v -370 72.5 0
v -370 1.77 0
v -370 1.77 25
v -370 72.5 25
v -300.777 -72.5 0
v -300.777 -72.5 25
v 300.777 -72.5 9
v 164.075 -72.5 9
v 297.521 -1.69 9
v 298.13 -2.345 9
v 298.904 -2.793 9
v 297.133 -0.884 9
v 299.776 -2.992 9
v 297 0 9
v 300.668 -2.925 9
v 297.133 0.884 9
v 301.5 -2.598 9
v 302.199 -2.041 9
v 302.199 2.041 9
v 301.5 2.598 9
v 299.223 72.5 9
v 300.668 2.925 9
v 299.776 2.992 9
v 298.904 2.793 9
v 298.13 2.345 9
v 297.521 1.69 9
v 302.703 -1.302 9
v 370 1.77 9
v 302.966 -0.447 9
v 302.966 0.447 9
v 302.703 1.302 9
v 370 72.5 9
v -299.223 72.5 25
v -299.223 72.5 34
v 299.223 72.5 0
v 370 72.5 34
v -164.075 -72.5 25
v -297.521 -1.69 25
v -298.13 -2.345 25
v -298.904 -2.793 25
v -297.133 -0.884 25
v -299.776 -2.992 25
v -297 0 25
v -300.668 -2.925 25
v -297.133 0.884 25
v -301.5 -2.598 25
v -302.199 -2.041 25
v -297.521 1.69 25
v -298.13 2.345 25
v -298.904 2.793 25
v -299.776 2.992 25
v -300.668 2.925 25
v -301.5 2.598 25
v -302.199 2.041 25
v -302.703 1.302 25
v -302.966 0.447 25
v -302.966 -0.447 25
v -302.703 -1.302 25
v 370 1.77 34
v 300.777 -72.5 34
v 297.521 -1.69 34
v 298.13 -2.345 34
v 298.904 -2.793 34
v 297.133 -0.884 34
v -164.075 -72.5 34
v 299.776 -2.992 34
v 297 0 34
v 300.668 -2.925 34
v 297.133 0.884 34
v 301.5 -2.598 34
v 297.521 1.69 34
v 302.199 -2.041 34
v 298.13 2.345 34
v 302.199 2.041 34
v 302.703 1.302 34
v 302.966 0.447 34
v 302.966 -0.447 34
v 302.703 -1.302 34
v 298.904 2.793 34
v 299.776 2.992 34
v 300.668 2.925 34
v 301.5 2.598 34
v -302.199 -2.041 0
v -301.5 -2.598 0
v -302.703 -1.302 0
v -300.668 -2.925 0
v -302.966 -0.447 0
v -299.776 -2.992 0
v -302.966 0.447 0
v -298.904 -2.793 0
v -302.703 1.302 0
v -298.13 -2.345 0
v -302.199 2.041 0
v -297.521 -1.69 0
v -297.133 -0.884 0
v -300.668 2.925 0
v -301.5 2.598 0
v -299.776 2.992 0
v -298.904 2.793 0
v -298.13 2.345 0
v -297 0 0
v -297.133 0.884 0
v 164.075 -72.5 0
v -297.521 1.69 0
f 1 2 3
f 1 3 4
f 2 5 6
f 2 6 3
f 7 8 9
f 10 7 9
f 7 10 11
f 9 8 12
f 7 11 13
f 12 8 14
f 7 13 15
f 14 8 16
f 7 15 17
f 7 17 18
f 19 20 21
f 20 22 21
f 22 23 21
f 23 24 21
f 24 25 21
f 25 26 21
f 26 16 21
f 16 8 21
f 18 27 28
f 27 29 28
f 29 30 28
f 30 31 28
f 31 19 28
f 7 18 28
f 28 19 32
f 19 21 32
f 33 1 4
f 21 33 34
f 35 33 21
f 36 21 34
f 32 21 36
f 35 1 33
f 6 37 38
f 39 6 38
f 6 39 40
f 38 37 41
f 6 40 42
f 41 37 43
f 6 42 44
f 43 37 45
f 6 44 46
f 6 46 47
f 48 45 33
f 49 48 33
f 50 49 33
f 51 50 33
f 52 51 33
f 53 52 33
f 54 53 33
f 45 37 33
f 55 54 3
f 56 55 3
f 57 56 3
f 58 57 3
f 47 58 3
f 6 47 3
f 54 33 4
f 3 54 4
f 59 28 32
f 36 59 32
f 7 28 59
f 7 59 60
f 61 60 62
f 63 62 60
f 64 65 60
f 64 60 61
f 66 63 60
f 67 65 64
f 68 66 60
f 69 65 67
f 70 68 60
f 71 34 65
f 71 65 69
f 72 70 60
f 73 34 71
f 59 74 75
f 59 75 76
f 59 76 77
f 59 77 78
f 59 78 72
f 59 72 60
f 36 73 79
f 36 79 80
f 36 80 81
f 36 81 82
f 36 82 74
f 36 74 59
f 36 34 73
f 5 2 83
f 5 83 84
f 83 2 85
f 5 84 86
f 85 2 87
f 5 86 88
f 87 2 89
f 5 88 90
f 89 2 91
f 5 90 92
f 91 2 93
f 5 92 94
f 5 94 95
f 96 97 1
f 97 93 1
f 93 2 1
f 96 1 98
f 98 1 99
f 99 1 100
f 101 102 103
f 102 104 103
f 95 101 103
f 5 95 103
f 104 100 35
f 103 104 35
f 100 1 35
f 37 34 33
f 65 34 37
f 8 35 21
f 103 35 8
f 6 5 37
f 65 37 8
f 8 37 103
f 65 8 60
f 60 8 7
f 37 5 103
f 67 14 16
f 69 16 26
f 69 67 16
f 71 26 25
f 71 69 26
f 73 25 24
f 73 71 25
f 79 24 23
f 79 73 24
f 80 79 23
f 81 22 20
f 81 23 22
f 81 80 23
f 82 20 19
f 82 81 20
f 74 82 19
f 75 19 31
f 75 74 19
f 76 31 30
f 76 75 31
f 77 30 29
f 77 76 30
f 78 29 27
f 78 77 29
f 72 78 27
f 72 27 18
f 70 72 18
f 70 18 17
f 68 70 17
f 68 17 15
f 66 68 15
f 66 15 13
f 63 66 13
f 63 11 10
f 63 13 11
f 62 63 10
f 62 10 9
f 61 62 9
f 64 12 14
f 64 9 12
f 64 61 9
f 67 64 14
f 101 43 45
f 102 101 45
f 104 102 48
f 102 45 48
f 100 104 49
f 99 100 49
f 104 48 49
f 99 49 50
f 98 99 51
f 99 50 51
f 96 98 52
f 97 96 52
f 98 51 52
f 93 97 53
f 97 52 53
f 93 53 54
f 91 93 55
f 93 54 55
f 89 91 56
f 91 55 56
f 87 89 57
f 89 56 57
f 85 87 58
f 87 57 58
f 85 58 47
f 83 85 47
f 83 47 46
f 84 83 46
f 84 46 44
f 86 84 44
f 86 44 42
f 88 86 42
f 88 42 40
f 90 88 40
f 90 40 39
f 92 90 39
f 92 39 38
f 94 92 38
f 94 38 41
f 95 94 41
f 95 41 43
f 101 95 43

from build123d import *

# Parameters (mm, degrees)
SKETCH1_W           = 740
SKETCH1_H           = 145
BOSS_EXTRUDE1_DEPTH = 34
SKETCH2_R           = 3
CUT_EXTRUDE1_DEPTH  = 379.566044436
CUT_EXTRUDE2_DEPTH  = 379.566044436
CUT_EXTRUDE3_DEPTH  = 9
CUT_EXTRUDE4_DEPTH  = 9


with BuildPart() as part:
    # Sketch1 → Boss-Extrude1 (new body)
    with BuildSketch(Plane.XY):
        Rectangle(SKETCH1_W, SKETCH1_H)
    extrude(amount=BOSS_EXTRUDE1_DEPTH)

    # Sketch2 → Cut-Extrude1 (cut, through all)
    with BuildSketch(Plane.XY.offset(34)):
        with Locations((-300, 0)):
            Circle(SKETCH2_R)
    cut_extrude1 = extrude(amount=-CUT_EXTRUDE1_DEPTH, mode=Mode.SUBTRACT)

    # Mirror1: Cut-Extrude1 across plane
    add(cut_extrude1.mirror(Plane(origin=(0, 0, 0), x_dir=(0, 0, 1), z_dir=(1, 0, 0))), mode=Mode.SUBTRACT)

    # Sketch3 → Cut-Extrude2 (cut, through all)
    with BuildSketch(Plane(origin=(0, 0, 0), x_dir=(-1, 0, 0), z_dir=(0, 0, -1))):
        Polygon((-370, 1.769559051), (-300.776712208, -72.5), (-300.776712208, -90.031965517), (-434.728473362, -90.031965517), (-434.728473362, 1.769559051), align=None)
        Polygon((300.776712208, -72.5), (370, 1.769559051), (452.615528046, -36.803788203), (398.593275425, -163.670382496), align=None)
    extrude(amount=-CUT_EXTRUDE2_DEPTH, mode=Mode.SUBTRACT)

    # Sketch4 → Cut-Extrude3 (cut)
    with BuildSketch(Plane.XY.offset(34)):
        Polygon((-485.714618039, 114.044241674), (-337.944791384, 114.044241674), (-115.198220107, -124.940212205), (-485.714618039, -111.910111467), align=None)
    extrude(amount=-CUT_EXTRUDE3_DEPTH, mode=Mode.SUBTRACT)

    # Sketch5 → Cut-Extrude4 (cut)
    with BuildSketch(Plane(origin=(0, 0, 0), x_dir=(-1, 0, 0), z_dir=(0, 0, -1))):
        Polygon((-568.705938923, 127.353116935), (-361.833214072, 139.674093651), (-111.696100657, -128.697630779), (-536.326991512, -147.10621474), align=None)
    extrude(amount=-CUT_EXTRUDE4_DEPTH, mode=Mode.SUBTRACT)


solid = part.part
